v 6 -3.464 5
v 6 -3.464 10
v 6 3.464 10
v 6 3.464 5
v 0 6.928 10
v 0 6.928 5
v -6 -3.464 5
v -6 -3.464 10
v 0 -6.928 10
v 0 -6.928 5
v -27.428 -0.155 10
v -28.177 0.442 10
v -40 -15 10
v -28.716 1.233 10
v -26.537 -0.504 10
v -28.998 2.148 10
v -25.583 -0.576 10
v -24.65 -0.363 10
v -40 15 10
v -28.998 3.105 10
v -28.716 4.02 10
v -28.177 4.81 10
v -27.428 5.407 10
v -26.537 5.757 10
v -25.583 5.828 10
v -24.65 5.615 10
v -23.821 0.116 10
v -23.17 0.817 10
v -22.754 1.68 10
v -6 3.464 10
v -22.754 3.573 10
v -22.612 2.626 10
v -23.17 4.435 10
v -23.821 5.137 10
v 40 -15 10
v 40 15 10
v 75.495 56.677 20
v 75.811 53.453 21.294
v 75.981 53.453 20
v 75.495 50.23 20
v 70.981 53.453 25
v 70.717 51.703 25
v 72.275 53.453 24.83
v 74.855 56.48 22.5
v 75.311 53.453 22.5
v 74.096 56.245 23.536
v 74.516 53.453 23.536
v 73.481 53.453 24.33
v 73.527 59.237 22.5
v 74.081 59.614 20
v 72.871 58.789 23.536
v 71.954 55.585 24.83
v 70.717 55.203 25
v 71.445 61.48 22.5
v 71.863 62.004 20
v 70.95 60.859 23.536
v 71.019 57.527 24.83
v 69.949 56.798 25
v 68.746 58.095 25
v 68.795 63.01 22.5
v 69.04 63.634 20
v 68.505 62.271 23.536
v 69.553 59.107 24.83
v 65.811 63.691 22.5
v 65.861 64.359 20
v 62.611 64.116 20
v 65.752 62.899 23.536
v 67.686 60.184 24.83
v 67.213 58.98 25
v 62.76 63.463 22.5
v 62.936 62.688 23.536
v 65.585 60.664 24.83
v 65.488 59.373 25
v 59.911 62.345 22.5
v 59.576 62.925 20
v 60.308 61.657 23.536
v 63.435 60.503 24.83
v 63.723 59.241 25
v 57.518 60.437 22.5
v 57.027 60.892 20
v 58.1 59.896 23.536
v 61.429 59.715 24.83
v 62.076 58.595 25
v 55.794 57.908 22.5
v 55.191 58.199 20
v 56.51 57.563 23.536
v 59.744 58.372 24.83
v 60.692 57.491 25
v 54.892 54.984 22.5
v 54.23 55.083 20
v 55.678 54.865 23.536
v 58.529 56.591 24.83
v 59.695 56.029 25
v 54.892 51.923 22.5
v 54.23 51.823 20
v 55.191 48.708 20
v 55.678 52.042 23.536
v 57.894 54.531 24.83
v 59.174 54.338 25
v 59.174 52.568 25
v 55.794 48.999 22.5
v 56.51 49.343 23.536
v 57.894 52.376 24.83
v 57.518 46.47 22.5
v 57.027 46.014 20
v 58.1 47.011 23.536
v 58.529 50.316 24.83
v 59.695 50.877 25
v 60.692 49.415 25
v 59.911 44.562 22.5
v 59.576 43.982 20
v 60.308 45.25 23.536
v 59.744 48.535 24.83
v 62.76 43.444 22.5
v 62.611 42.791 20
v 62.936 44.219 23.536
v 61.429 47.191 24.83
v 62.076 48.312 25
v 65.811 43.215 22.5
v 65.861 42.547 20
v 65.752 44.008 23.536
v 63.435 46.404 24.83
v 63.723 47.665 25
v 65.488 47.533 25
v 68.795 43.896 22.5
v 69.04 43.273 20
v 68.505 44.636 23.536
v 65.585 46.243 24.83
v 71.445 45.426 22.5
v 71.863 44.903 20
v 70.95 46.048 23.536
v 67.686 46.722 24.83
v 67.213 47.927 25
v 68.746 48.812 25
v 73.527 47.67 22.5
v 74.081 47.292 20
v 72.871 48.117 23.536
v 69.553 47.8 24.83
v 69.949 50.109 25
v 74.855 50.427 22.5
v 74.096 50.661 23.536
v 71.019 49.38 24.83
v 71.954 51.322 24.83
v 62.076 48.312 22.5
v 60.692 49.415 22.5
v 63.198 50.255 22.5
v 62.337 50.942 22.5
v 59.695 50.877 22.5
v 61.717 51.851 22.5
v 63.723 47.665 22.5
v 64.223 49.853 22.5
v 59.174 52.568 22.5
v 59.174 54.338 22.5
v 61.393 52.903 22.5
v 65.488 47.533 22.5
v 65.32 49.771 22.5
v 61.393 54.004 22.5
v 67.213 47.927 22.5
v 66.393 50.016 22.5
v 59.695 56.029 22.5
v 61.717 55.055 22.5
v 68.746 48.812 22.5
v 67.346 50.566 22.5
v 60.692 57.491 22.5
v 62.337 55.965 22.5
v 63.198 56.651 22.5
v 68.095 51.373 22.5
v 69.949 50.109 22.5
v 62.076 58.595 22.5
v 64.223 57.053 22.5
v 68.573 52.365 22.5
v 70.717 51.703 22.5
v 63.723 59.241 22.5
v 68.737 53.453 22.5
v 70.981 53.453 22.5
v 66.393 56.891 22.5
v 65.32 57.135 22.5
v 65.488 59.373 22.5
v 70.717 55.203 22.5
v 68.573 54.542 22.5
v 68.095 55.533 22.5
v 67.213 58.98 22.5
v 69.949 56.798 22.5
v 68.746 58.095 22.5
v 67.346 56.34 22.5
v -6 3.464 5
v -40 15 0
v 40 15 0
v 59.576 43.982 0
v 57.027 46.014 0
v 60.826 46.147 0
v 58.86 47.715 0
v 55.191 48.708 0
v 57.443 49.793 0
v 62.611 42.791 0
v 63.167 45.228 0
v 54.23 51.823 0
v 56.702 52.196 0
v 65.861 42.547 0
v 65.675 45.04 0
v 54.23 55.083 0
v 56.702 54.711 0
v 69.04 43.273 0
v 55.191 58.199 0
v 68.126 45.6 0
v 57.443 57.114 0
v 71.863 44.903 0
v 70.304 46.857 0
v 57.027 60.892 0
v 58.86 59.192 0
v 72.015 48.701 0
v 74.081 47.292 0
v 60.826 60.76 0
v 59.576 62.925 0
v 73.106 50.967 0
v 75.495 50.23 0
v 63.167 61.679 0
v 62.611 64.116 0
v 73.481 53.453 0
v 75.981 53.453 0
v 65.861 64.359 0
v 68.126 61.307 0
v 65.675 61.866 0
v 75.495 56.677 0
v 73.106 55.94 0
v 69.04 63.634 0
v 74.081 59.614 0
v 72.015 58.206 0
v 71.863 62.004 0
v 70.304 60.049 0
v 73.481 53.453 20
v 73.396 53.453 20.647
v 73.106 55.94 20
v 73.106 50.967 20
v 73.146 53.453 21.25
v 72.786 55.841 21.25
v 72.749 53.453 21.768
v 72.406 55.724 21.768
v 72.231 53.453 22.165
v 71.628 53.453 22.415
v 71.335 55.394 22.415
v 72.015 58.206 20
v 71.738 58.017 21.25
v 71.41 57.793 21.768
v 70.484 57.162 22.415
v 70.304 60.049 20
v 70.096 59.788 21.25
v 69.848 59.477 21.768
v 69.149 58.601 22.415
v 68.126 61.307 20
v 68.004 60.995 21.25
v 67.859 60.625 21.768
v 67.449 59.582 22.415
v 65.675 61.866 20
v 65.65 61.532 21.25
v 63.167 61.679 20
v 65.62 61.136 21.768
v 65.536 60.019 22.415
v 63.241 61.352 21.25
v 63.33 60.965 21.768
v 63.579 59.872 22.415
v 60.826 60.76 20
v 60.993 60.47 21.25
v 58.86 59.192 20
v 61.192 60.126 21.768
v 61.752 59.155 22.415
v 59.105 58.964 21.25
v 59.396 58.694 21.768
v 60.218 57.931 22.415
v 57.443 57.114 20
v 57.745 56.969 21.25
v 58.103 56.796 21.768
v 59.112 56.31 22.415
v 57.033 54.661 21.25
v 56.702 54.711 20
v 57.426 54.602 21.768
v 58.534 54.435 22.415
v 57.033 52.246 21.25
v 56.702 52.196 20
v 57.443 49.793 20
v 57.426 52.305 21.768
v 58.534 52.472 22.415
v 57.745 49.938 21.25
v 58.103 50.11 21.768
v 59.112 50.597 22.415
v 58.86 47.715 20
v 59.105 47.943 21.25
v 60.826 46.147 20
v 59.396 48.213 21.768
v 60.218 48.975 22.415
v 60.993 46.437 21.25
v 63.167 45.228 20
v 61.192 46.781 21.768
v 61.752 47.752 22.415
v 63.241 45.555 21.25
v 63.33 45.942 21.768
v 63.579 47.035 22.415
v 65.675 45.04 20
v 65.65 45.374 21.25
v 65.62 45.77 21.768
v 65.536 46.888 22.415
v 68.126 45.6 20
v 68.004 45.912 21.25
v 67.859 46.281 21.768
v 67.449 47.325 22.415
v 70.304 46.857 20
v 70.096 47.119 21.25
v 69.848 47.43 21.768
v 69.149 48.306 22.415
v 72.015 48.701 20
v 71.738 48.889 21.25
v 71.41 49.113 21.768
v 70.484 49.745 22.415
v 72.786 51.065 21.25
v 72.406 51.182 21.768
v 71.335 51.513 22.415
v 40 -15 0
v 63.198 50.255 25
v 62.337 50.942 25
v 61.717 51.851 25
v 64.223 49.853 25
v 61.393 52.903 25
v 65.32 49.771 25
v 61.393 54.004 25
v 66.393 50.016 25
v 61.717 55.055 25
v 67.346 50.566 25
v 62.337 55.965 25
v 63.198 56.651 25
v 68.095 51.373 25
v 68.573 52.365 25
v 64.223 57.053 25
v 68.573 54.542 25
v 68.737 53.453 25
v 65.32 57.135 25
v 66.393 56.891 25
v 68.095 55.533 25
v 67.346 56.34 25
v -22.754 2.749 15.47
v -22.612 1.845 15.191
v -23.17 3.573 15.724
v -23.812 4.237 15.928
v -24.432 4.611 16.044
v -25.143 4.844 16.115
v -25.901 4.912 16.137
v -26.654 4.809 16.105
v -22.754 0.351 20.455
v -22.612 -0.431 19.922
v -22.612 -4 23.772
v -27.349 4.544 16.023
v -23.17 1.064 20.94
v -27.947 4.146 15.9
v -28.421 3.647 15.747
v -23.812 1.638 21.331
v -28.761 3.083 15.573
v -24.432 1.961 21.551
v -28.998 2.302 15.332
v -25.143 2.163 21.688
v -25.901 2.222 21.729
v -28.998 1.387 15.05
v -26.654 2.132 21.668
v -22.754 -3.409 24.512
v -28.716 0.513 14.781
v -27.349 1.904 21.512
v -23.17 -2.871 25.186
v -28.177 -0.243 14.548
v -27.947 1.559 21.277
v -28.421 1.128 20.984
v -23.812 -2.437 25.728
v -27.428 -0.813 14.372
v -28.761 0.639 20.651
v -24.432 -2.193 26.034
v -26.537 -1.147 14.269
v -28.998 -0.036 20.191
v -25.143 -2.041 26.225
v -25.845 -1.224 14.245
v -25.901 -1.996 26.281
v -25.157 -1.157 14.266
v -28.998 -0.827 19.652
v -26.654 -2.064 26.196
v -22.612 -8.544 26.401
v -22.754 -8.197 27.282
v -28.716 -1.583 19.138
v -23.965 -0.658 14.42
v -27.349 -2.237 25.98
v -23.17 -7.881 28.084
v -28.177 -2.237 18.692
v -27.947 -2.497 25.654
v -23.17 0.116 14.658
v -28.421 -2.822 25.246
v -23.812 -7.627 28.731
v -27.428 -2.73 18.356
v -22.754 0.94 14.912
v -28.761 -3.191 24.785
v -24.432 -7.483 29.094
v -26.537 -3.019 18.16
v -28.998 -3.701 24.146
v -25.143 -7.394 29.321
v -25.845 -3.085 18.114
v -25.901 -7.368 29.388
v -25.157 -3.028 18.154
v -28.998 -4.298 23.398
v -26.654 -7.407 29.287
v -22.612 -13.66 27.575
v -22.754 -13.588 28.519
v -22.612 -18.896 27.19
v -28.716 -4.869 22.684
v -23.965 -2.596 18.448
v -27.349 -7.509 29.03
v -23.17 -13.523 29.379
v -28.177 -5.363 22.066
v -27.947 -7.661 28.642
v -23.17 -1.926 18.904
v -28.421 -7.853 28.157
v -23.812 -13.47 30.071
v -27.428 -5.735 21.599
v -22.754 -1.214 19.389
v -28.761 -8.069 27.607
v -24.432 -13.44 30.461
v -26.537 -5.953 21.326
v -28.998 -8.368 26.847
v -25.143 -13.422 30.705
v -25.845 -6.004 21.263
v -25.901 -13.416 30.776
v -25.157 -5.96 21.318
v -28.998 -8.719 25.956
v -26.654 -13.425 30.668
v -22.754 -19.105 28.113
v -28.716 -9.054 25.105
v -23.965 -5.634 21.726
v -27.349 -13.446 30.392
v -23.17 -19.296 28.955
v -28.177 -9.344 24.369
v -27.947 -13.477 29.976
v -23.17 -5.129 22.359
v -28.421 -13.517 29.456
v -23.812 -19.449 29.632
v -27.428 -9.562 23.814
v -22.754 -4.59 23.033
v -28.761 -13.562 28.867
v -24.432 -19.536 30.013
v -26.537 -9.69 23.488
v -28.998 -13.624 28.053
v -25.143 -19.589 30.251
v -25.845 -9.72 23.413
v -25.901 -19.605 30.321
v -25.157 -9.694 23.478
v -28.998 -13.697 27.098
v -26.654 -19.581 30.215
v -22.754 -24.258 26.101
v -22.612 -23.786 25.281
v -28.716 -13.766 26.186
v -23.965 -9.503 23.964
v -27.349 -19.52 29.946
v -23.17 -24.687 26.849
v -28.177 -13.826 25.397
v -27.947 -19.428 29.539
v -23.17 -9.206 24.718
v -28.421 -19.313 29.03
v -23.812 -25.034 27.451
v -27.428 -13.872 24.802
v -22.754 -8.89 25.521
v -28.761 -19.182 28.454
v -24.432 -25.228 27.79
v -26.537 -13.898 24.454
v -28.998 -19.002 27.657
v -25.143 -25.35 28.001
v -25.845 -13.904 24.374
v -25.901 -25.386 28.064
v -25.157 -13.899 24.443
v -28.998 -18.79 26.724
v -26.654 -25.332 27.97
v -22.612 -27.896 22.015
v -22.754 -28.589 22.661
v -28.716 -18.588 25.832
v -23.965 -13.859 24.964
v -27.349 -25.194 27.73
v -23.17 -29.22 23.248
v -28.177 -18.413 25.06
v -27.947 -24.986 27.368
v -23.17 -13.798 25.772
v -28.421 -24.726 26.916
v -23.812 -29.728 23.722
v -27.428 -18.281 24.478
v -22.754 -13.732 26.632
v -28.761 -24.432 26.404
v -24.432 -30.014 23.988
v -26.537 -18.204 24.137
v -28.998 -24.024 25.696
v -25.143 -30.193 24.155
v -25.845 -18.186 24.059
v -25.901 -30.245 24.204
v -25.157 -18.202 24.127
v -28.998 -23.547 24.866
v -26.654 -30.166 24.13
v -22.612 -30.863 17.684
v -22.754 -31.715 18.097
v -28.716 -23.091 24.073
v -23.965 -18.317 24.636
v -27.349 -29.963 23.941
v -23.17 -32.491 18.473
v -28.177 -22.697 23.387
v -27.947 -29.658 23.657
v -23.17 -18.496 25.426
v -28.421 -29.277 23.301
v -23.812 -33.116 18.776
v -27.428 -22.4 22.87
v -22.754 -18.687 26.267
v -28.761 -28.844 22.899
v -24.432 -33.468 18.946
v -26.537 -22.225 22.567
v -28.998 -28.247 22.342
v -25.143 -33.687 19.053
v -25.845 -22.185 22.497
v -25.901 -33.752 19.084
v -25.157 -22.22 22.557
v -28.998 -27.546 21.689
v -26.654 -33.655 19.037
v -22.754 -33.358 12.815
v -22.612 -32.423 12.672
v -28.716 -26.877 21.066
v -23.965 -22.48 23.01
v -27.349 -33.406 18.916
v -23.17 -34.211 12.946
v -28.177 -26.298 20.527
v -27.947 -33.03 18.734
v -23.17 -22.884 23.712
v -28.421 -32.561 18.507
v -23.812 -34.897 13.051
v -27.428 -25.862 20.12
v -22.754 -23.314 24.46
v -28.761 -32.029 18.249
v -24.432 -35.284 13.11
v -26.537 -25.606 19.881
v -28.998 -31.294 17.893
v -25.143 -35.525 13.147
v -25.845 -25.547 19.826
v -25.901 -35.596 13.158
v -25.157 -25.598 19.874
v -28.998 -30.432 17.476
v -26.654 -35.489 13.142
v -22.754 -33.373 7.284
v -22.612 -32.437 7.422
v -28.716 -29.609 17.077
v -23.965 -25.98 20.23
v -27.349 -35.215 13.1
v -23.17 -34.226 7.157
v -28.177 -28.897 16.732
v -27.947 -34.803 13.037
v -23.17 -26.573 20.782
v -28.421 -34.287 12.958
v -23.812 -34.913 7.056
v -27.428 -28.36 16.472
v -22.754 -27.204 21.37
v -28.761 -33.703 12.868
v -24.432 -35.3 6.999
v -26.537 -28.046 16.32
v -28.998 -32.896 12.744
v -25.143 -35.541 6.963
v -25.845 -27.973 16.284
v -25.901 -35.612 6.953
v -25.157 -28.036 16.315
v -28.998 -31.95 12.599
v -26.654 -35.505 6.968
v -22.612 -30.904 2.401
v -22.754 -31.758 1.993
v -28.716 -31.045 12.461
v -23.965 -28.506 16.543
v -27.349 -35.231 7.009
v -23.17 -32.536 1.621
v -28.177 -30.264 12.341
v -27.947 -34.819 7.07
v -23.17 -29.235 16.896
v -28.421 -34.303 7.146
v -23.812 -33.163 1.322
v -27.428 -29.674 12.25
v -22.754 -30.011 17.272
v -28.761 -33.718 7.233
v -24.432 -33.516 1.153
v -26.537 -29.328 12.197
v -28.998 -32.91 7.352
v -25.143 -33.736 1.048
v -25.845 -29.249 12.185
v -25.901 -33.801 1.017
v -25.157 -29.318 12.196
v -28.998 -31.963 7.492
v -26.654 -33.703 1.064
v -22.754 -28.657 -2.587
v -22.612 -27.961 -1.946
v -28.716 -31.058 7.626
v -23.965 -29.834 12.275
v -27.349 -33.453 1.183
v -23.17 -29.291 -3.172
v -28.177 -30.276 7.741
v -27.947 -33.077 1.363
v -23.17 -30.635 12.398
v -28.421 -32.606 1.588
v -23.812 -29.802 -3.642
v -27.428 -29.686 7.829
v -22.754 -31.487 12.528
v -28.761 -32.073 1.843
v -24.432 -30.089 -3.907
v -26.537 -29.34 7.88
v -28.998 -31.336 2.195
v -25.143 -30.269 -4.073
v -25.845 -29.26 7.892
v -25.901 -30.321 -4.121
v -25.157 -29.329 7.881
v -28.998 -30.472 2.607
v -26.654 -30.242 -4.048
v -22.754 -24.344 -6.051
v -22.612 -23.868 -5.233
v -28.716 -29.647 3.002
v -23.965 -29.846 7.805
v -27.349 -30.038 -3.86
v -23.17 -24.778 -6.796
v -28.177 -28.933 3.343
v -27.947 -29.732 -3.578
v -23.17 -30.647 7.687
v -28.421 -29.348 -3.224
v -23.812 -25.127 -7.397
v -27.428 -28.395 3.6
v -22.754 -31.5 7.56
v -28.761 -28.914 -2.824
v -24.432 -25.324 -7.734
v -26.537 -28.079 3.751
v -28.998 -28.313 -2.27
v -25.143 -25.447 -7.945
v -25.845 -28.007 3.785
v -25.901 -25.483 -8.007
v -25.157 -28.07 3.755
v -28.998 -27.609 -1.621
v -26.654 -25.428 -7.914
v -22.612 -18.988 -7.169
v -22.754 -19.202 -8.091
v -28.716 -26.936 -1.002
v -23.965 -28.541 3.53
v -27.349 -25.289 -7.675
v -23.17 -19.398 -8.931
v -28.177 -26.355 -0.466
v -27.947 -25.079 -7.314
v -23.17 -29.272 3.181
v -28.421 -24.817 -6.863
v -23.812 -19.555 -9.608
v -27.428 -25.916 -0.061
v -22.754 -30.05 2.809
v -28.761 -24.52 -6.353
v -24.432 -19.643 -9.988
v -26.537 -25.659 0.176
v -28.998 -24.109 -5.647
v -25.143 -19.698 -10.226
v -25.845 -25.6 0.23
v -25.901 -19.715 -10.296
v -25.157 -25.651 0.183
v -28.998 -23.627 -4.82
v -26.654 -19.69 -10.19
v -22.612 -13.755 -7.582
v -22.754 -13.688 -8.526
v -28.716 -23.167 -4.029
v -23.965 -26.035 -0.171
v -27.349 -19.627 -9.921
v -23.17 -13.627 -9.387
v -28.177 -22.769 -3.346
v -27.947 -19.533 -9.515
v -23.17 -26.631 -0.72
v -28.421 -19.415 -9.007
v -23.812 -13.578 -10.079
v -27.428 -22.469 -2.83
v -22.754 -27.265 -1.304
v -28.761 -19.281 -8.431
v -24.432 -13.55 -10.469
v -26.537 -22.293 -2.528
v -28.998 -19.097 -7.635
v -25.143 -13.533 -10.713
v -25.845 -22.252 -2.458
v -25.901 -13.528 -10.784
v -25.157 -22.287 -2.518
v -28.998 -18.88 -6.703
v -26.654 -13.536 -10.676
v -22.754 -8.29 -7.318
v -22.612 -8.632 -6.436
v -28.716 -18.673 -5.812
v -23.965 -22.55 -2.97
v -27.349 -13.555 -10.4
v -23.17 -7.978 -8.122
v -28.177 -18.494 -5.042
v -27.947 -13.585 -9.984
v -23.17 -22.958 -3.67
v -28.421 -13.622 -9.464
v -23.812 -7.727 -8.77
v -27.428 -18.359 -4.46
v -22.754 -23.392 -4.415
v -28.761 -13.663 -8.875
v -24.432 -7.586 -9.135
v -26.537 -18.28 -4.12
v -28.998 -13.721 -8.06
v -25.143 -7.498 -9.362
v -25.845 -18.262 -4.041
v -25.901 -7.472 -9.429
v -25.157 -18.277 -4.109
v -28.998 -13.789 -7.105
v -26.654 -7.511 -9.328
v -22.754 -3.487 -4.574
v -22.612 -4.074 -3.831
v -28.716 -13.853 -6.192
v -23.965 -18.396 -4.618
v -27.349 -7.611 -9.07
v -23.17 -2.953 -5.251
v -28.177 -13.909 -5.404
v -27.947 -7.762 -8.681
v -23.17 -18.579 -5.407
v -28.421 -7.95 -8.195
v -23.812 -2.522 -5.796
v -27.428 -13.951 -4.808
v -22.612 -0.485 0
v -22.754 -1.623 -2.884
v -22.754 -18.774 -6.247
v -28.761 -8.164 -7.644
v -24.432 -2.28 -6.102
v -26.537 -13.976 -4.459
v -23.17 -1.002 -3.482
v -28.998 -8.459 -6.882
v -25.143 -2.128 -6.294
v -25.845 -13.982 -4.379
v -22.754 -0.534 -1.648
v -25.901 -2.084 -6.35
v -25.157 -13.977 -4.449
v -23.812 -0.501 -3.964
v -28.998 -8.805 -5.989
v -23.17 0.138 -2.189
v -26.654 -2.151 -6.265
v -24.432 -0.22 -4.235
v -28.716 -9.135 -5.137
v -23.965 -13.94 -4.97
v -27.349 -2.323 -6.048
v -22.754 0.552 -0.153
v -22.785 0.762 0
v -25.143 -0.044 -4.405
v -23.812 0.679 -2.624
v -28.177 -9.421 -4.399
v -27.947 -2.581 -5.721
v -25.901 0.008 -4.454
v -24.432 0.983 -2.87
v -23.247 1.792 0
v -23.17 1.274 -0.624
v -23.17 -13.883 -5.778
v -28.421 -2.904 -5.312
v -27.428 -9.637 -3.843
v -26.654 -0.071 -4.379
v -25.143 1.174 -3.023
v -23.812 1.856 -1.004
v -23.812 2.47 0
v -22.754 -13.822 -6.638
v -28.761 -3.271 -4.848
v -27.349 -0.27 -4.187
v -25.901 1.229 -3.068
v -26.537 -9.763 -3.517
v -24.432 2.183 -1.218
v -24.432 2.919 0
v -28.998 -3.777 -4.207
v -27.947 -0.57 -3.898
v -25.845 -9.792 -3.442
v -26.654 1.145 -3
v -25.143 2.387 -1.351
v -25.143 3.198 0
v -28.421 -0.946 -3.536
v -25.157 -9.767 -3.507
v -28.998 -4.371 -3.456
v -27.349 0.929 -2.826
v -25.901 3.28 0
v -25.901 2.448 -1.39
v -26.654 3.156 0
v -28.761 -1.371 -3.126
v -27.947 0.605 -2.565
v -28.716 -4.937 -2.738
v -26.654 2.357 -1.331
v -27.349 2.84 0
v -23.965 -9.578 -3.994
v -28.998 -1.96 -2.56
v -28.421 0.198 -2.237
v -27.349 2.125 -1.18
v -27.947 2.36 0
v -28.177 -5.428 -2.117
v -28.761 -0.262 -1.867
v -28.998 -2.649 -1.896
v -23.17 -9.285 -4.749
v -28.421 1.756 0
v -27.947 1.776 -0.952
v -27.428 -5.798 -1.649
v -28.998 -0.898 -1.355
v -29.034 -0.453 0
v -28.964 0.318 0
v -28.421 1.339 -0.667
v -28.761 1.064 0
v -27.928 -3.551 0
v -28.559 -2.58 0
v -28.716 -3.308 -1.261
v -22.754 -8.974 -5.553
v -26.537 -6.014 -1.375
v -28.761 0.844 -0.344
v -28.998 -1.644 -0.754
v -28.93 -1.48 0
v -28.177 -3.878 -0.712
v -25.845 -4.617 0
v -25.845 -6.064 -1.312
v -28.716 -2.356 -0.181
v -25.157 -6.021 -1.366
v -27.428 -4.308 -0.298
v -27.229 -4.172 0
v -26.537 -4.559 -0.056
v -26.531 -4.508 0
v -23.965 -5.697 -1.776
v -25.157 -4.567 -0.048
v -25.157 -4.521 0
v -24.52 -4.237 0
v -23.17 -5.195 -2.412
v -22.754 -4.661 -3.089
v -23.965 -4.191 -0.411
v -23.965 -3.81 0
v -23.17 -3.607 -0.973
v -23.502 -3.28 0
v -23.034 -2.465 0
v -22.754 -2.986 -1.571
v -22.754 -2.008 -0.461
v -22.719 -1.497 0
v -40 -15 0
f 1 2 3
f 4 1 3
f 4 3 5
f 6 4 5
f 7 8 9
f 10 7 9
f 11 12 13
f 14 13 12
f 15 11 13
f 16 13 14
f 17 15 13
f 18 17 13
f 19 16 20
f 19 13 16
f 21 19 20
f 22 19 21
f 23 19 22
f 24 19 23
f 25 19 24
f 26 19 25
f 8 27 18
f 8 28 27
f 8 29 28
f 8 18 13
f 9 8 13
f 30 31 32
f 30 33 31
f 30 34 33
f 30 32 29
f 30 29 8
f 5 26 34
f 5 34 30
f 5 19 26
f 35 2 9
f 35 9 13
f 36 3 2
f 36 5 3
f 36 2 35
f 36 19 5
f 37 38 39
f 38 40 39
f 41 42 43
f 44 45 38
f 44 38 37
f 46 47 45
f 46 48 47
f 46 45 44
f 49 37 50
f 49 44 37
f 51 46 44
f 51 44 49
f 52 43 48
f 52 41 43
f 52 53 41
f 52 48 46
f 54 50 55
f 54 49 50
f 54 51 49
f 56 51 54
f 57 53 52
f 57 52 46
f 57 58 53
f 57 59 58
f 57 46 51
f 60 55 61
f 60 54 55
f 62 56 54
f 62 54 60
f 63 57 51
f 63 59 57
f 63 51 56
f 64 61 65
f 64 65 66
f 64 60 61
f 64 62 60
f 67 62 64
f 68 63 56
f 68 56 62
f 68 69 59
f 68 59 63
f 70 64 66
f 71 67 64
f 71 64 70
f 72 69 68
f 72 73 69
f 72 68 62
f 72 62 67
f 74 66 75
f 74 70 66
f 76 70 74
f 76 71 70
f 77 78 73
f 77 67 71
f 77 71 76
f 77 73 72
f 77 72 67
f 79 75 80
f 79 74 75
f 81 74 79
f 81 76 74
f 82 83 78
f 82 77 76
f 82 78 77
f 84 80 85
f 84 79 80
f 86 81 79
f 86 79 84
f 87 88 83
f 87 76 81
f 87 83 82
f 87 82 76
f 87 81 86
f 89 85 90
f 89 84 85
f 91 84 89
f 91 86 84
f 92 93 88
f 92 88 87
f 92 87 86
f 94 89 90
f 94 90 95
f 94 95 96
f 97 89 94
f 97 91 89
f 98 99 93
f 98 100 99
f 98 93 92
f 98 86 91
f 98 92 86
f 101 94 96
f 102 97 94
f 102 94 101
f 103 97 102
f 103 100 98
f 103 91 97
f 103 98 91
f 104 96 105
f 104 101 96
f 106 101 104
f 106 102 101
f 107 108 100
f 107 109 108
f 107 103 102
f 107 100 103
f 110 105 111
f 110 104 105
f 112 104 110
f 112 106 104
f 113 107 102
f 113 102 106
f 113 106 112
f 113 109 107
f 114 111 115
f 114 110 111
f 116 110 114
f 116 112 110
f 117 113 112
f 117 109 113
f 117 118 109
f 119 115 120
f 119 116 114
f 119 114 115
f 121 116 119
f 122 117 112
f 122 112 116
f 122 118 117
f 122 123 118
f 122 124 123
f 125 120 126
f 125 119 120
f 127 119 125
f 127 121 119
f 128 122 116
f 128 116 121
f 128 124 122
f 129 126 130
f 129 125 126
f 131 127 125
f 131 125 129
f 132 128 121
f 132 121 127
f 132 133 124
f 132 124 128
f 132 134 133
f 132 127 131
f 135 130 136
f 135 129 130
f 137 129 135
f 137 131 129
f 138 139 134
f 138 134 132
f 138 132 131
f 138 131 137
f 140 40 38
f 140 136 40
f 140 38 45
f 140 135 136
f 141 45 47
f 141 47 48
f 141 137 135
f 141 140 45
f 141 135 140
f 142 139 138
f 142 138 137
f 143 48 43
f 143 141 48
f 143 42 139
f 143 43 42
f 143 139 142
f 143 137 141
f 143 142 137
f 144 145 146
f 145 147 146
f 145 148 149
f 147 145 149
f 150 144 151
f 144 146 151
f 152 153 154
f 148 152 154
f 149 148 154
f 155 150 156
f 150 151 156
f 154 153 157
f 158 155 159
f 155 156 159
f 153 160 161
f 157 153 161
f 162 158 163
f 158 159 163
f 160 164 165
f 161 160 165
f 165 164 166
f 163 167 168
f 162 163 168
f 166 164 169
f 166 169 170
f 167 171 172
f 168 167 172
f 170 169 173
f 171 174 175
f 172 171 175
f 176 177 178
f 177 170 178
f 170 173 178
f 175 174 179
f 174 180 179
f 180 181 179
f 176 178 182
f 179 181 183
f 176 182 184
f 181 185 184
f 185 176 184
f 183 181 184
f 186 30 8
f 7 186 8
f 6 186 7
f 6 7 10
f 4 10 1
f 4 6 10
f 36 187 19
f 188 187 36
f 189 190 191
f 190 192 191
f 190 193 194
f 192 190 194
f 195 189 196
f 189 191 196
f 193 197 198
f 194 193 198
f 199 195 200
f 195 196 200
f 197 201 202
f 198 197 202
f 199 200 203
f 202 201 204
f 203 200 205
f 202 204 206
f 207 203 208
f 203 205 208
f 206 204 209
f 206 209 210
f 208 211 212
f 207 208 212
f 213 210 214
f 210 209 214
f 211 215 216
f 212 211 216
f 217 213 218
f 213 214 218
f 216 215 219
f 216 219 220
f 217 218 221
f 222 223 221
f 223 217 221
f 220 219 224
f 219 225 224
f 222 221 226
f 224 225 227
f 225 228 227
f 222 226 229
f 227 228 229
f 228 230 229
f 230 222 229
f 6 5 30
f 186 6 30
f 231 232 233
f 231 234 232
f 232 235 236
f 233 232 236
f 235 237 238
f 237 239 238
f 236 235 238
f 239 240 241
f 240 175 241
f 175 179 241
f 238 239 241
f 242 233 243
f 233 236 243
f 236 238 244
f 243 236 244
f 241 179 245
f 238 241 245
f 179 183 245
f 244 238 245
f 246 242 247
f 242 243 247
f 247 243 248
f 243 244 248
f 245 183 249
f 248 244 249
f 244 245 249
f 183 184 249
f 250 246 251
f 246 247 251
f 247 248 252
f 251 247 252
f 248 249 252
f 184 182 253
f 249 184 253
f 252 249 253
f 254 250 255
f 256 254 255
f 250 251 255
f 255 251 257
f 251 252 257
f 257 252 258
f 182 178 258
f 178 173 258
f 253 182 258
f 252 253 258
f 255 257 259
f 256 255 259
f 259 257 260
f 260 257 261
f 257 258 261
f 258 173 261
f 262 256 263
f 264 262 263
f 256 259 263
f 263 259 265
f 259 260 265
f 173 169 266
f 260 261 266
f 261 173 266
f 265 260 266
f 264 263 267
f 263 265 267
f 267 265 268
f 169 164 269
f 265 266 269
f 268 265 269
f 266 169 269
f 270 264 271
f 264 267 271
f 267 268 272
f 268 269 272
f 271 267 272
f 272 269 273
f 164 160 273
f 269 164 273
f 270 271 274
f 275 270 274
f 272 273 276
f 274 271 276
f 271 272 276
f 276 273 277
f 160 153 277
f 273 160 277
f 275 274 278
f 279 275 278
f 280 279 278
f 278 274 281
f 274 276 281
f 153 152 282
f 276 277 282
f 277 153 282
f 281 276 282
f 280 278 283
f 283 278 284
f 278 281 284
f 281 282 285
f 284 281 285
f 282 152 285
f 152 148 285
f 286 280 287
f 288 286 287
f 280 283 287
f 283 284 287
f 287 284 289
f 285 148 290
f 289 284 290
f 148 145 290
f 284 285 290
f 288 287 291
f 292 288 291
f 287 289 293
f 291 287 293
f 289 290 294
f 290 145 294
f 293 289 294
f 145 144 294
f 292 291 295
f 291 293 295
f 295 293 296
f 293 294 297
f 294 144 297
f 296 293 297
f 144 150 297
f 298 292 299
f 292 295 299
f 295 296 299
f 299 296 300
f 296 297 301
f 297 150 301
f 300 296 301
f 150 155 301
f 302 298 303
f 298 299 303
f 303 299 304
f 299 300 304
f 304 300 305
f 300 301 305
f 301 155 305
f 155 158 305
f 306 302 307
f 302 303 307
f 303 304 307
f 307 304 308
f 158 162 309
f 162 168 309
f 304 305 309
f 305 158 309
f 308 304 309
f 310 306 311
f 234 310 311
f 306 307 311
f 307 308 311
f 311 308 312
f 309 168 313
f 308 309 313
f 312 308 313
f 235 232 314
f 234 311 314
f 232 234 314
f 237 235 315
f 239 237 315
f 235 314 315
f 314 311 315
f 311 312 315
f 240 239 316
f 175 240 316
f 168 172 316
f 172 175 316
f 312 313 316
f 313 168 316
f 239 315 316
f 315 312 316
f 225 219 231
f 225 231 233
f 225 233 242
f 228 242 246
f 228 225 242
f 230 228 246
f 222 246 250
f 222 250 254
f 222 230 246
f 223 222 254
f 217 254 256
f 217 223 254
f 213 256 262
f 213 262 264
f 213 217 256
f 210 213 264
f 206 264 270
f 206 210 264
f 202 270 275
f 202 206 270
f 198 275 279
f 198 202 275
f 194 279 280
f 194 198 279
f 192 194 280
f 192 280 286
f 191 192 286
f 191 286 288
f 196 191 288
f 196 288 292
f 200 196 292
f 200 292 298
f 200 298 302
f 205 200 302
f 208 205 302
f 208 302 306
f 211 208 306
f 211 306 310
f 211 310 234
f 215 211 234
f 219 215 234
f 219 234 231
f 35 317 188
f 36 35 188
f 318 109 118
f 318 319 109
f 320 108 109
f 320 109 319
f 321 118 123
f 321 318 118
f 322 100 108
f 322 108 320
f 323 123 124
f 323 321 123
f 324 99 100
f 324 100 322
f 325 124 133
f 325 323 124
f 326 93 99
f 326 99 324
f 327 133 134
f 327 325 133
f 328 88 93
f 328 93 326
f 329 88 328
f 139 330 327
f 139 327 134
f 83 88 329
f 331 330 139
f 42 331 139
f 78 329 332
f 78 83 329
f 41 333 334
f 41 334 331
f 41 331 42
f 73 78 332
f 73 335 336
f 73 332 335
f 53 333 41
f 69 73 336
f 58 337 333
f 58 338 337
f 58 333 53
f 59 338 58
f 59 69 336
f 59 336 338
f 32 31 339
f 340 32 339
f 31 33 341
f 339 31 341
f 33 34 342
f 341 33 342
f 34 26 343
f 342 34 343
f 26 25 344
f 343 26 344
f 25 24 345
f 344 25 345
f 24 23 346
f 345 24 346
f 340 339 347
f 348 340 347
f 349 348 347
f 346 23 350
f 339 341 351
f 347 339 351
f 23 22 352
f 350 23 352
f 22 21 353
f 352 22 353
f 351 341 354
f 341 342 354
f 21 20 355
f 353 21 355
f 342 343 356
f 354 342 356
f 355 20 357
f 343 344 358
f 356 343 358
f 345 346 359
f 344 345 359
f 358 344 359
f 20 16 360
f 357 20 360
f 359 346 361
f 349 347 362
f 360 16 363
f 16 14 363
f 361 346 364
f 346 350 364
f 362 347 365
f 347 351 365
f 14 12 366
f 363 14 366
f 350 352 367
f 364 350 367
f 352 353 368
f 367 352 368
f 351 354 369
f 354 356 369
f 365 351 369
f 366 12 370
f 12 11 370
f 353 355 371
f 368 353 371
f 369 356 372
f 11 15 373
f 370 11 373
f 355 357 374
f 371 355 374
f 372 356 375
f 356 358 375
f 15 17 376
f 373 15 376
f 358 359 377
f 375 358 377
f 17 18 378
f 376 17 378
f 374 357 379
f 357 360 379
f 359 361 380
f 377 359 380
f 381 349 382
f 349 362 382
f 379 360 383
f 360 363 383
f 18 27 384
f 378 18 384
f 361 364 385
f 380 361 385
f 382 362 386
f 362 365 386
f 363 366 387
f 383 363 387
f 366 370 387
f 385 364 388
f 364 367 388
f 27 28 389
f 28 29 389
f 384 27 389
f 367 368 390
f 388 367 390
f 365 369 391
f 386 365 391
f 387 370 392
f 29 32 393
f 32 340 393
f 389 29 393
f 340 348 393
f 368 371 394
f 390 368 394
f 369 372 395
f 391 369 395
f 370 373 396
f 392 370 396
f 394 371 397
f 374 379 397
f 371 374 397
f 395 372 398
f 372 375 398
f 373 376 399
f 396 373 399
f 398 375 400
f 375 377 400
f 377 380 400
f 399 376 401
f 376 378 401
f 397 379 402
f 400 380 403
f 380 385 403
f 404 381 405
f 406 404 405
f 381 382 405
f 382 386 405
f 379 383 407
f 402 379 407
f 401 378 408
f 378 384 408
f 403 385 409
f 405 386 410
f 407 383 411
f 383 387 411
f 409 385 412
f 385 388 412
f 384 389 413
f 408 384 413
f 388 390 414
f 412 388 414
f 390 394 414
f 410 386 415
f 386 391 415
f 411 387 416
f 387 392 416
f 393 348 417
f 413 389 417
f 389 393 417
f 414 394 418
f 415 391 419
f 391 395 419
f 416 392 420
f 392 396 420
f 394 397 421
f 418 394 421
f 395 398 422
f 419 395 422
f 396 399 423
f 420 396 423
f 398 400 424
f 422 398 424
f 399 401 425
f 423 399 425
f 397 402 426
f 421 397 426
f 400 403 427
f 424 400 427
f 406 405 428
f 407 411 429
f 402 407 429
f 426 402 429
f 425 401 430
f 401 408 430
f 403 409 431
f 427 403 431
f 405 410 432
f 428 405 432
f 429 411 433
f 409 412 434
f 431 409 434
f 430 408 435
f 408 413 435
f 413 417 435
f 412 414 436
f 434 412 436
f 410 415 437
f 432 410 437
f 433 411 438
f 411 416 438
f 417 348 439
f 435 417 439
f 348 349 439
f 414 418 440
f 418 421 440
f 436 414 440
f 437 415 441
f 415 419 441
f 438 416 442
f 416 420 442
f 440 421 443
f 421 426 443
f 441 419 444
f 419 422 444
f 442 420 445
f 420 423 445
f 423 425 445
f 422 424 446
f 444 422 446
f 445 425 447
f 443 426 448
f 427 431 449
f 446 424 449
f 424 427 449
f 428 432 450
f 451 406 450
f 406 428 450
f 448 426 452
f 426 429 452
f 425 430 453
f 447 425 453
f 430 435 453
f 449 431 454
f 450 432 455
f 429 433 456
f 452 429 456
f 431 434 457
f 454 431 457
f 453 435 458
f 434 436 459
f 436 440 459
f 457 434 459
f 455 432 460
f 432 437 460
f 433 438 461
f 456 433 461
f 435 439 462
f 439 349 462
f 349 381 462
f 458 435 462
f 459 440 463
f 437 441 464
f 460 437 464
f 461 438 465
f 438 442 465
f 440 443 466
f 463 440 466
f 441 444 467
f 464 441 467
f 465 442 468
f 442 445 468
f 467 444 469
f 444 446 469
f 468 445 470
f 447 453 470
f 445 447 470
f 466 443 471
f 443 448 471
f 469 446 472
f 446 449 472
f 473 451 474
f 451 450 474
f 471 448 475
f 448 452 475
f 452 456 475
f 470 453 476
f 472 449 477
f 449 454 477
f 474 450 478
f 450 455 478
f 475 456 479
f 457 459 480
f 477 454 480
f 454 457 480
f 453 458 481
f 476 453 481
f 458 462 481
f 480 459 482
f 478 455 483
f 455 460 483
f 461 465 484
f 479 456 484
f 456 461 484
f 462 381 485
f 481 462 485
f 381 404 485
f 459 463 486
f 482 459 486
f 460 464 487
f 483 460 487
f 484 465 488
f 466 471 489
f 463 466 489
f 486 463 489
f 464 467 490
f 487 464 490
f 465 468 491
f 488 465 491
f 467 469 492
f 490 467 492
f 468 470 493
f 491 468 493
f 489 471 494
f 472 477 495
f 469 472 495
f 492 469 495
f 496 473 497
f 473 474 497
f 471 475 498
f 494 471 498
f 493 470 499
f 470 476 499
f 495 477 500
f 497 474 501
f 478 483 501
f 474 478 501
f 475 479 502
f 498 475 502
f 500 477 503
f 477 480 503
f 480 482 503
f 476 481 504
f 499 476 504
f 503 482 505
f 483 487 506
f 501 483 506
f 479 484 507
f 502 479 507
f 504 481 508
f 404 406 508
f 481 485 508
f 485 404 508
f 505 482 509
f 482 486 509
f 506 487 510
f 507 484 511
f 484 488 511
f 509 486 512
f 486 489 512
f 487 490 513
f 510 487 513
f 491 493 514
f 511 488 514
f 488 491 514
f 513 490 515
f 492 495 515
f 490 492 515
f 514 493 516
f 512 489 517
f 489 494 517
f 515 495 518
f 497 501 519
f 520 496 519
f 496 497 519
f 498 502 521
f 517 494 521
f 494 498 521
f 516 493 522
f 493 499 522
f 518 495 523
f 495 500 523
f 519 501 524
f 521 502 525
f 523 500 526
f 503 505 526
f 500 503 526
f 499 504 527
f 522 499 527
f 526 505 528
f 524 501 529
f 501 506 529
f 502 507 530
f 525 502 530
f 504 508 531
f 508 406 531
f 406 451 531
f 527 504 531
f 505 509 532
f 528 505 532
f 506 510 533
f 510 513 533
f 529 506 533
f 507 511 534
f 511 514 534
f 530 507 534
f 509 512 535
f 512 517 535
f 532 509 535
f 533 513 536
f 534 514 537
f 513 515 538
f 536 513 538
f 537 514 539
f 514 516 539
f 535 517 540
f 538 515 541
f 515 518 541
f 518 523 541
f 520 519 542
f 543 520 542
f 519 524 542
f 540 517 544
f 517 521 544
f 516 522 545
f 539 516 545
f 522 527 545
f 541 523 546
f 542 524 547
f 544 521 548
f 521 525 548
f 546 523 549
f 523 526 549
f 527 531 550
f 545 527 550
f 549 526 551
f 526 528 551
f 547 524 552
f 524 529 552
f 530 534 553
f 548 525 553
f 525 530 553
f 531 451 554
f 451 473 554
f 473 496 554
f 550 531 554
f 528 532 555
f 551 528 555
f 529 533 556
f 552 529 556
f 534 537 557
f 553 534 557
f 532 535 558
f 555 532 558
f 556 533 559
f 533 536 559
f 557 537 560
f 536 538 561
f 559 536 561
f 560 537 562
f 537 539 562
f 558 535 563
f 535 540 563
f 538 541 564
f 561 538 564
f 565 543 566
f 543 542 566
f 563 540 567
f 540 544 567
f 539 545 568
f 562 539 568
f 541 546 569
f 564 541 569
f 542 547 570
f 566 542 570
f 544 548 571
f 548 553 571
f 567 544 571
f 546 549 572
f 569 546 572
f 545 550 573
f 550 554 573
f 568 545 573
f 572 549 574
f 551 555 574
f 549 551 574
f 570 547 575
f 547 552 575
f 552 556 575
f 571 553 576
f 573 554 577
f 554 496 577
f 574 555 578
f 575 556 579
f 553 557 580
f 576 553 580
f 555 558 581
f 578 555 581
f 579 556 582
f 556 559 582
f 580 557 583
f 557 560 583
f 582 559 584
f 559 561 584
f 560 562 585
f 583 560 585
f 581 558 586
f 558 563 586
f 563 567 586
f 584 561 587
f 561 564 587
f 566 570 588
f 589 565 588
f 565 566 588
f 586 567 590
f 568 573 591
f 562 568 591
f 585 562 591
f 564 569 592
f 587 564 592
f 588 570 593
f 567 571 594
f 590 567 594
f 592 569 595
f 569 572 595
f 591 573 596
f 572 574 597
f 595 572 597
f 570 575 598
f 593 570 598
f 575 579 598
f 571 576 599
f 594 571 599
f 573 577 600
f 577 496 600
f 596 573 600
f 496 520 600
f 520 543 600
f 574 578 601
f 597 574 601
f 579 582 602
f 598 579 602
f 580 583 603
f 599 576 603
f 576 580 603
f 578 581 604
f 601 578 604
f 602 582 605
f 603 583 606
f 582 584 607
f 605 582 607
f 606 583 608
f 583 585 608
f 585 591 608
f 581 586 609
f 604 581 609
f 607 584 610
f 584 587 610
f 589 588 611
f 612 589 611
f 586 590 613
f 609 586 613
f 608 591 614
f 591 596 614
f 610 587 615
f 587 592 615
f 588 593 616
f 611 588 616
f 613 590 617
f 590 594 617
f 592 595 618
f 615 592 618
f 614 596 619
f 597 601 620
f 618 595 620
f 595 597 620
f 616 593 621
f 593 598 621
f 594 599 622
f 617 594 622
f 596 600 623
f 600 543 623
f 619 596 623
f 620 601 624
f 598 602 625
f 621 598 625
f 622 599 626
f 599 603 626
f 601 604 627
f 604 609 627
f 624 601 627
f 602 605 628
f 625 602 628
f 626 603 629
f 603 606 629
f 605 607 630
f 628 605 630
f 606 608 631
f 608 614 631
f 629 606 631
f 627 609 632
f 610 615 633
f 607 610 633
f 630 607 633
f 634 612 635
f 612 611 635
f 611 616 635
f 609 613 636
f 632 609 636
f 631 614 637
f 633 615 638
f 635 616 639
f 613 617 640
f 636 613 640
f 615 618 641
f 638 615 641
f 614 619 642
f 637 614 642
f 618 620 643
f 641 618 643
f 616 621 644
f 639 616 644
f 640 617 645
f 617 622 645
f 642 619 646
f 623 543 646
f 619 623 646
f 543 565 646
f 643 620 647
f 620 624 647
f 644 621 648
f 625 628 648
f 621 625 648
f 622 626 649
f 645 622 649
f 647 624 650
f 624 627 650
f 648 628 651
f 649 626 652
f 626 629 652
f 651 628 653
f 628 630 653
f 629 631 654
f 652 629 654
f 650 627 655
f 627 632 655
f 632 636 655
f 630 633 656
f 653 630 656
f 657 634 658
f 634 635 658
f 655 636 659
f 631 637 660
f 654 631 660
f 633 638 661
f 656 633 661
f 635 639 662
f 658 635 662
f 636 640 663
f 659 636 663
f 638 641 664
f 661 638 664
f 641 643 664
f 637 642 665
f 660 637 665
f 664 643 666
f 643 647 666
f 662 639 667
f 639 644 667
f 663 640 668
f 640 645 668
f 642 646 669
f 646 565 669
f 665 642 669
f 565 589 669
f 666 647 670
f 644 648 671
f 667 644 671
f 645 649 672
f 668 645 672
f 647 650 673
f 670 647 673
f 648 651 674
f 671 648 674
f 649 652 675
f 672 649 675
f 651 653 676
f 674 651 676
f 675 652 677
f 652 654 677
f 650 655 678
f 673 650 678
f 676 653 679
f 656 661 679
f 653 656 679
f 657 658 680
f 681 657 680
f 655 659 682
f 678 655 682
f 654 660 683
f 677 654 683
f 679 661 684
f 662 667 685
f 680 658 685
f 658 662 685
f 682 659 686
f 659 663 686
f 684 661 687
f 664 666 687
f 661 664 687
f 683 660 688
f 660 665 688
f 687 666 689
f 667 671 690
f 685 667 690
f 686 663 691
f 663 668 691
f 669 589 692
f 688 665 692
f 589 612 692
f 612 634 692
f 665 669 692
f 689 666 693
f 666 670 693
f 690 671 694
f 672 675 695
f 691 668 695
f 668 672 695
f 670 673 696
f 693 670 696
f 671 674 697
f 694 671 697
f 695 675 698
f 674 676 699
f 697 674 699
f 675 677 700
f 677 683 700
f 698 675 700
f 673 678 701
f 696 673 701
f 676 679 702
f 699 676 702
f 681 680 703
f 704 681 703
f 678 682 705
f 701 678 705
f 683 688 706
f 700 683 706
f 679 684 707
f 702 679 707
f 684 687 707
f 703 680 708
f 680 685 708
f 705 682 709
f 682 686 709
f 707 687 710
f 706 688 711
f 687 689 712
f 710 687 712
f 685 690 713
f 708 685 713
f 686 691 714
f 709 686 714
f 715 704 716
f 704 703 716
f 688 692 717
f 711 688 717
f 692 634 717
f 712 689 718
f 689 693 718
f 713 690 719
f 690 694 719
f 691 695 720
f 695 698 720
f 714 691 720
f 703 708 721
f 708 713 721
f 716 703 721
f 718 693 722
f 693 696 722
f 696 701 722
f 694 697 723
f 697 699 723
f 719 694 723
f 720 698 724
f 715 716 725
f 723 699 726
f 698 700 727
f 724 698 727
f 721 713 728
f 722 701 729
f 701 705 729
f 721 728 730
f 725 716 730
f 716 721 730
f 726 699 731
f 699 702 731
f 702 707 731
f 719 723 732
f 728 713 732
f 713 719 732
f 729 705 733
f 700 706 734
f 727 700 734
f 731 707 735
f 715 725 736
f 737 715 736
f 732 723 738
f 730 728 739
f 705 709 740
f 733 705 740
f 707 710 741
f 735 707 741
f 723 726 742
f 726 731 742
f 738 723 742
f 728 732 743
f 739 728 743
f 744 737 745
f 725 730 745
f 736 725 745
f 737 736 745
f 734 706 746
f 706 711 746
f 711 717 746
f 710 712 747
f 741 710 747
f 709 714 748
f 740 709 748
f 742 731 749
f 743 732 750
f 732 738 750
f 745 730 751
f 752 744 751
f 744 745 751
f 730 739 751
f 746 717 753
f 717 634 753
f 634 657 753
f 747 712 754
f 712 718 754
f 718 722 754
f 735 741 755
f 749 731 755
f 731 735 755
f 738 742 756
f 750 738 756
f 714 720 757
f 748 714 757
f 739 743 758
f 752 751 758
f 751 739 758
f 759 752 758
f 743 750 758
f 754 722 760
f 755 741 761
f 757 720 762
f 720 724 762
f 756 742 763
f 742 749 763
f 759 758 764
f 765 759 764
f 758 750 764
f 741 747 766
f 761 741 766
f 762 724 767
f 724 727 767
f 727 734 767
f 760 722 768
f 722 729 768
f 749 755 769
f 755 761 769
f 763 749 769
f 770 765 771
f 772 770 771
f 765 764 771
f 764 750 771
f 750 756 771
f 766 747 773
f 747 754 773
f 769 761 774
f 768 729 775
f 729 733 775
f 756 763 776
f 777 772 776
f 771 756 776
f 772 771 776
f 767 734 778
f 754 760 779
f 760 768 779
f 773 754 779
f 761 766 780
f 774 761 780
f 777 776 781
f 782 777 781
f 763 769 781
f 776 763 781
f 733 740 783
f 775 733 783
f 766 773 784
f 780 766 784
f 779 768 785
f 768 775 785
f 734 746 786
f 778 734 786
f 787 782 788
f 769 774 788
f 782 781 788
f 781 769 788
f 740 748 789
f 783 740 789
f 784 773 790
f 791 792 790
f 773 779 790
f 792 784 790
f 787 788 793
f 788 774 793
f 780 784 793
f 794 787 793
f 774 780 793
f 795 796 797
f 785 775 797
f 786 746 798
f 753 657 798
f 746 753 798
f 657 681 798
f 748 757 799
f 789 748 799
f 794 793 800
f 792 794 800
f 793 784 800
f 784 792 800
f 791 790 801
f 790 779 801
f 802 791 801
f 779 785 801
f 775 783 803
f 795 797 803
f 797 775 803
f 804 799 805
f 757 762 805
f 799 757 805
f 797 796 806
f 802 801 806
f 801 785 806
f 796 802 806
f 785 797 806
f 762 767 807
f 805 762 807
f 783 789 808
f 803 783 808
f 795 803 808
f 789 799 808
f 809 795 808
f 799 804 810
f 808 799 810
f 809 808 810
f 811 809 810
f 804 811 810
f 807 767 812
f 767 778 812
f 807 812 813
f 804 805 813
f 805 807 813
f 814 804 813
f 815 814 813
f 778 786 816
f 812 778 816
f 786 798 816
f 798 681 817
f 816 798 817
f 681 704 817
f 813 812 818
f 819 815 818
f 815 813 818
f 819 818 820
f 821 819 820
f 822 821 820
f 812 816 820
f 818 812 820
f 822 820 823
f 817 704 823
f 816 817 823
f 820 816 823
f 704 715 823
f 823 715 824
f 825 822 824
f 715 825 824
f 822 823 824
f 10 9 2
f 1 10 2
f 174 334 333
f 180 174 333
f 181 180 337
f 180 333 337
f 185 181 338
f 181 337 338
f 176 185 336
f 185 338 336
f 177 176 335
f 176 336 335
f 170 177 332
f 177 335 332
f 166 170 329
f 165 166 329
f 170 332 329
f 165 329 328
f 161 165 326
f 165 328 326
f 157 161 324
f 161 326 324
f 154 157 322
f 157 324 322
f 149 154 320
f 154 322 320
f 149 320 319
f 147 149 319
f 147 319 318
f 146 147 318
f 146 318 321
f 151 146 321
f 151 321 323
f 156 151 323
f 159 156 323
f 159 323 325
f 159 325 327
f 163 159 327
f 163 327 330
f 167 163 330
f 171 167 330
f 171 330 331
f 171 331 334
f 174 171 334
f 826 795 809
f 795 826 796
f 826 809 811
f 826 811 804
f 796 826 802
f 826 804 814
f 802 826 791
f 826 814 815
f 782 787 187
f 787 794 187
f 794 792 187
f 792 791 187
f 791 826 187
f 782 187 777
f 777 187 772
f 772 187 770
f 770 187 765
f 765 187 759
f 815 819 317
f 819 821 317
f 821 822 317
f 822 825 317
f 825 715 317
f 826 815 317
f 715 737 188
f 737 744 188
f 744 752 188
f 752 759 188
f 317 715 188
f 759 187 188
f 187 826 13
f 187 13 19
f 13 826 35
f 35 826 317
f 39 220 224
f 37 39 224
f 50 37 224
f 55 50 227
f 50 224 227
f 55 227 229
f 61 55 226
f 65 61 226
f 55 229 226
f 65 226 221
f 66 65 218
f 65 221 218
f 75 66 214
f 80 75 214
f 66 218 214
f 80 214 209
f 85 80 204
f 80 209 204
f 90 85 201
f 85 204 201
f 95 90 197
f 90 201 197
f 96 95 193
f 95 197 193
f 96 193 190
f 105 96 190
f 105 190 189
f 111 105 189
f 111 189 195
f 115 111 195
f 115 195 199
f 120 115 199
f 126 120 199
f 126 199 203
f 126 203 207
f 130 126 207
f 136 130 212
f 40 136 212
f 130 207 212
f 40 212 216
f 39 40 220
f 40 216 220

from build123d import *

# Parameters (mm, degrees)
F0_W      = 80
F0_H      = 30
F1_DEPTH  = 10
F3_DEPTH  = 5
F4_R      = 3.211143
F6_R      = 10.936743
F7_DEPTH  = 25
F8_R      = 5
F9_T      = -2.5
F10_R     = 3.69251
F11_DEPTH = 25


with BuildPart() as f1:
    # F0 (on Top) → F1 (new body)
    with BuildSketch(Plane.XY):
        Rectangle(F0_W, F0_H)
    extrude(amount=F1_DEPTH)

    # F2 (on face) → F3 (cut)
    with BuildSketch(Plane.XY.offset(10)):
        Polygon((6, -3.464102), (6, 3.464102), (0, 6.928203), (-6, 3.464102), (-6, -3.464102), (0, -6.928203), align=None)
    extrude(amount=-F3_DEPTH, mode=Mode.SUBTRACT)

    # F4 (on face) → F5 (revolve)
    with BuildSketch(Plane.XY.offset(10)):
        with Locations((-25.822865, 2.626295)):
            Circle(F4_R)
    revolve(axis=Axis((0, -15, 10), (1, 0, 0)))


with BuildPart() as f7:
    # F6 (on Top) → F7 (new body)
    with BuildSketch(Plane.XY):
        with Locations((65.044165, 53.453304)):
            Circle(F6_R)
    extrude(amount=F7_DEPTH)

    # F8
    f8_edges = [f7.edges().sort_by_distance(p)[0] for p in [
        (54.107422, 53.453304, 25),
    ]]
    fillet(f8_edges, radius=F8_R)

    # F9
    f9_openings = [f7.faces().sort_by_distance(p)[0] for p in [
        (65.044165, 53.453304, 0),
    ]]
    offset(amount=F9_T, openings=f9_openings)

    # F10 (on face) → F11 (cut)
    with BuildSketch(Plane.XY.offset(25)):
        with Locations((65.044165, 53.453304)):
            Circle(F10_R)
    extrude(amount=-F11_DEPTH, mode=Mode.SUBTRACT)


solid = Compound([f1.part, f7.part])
